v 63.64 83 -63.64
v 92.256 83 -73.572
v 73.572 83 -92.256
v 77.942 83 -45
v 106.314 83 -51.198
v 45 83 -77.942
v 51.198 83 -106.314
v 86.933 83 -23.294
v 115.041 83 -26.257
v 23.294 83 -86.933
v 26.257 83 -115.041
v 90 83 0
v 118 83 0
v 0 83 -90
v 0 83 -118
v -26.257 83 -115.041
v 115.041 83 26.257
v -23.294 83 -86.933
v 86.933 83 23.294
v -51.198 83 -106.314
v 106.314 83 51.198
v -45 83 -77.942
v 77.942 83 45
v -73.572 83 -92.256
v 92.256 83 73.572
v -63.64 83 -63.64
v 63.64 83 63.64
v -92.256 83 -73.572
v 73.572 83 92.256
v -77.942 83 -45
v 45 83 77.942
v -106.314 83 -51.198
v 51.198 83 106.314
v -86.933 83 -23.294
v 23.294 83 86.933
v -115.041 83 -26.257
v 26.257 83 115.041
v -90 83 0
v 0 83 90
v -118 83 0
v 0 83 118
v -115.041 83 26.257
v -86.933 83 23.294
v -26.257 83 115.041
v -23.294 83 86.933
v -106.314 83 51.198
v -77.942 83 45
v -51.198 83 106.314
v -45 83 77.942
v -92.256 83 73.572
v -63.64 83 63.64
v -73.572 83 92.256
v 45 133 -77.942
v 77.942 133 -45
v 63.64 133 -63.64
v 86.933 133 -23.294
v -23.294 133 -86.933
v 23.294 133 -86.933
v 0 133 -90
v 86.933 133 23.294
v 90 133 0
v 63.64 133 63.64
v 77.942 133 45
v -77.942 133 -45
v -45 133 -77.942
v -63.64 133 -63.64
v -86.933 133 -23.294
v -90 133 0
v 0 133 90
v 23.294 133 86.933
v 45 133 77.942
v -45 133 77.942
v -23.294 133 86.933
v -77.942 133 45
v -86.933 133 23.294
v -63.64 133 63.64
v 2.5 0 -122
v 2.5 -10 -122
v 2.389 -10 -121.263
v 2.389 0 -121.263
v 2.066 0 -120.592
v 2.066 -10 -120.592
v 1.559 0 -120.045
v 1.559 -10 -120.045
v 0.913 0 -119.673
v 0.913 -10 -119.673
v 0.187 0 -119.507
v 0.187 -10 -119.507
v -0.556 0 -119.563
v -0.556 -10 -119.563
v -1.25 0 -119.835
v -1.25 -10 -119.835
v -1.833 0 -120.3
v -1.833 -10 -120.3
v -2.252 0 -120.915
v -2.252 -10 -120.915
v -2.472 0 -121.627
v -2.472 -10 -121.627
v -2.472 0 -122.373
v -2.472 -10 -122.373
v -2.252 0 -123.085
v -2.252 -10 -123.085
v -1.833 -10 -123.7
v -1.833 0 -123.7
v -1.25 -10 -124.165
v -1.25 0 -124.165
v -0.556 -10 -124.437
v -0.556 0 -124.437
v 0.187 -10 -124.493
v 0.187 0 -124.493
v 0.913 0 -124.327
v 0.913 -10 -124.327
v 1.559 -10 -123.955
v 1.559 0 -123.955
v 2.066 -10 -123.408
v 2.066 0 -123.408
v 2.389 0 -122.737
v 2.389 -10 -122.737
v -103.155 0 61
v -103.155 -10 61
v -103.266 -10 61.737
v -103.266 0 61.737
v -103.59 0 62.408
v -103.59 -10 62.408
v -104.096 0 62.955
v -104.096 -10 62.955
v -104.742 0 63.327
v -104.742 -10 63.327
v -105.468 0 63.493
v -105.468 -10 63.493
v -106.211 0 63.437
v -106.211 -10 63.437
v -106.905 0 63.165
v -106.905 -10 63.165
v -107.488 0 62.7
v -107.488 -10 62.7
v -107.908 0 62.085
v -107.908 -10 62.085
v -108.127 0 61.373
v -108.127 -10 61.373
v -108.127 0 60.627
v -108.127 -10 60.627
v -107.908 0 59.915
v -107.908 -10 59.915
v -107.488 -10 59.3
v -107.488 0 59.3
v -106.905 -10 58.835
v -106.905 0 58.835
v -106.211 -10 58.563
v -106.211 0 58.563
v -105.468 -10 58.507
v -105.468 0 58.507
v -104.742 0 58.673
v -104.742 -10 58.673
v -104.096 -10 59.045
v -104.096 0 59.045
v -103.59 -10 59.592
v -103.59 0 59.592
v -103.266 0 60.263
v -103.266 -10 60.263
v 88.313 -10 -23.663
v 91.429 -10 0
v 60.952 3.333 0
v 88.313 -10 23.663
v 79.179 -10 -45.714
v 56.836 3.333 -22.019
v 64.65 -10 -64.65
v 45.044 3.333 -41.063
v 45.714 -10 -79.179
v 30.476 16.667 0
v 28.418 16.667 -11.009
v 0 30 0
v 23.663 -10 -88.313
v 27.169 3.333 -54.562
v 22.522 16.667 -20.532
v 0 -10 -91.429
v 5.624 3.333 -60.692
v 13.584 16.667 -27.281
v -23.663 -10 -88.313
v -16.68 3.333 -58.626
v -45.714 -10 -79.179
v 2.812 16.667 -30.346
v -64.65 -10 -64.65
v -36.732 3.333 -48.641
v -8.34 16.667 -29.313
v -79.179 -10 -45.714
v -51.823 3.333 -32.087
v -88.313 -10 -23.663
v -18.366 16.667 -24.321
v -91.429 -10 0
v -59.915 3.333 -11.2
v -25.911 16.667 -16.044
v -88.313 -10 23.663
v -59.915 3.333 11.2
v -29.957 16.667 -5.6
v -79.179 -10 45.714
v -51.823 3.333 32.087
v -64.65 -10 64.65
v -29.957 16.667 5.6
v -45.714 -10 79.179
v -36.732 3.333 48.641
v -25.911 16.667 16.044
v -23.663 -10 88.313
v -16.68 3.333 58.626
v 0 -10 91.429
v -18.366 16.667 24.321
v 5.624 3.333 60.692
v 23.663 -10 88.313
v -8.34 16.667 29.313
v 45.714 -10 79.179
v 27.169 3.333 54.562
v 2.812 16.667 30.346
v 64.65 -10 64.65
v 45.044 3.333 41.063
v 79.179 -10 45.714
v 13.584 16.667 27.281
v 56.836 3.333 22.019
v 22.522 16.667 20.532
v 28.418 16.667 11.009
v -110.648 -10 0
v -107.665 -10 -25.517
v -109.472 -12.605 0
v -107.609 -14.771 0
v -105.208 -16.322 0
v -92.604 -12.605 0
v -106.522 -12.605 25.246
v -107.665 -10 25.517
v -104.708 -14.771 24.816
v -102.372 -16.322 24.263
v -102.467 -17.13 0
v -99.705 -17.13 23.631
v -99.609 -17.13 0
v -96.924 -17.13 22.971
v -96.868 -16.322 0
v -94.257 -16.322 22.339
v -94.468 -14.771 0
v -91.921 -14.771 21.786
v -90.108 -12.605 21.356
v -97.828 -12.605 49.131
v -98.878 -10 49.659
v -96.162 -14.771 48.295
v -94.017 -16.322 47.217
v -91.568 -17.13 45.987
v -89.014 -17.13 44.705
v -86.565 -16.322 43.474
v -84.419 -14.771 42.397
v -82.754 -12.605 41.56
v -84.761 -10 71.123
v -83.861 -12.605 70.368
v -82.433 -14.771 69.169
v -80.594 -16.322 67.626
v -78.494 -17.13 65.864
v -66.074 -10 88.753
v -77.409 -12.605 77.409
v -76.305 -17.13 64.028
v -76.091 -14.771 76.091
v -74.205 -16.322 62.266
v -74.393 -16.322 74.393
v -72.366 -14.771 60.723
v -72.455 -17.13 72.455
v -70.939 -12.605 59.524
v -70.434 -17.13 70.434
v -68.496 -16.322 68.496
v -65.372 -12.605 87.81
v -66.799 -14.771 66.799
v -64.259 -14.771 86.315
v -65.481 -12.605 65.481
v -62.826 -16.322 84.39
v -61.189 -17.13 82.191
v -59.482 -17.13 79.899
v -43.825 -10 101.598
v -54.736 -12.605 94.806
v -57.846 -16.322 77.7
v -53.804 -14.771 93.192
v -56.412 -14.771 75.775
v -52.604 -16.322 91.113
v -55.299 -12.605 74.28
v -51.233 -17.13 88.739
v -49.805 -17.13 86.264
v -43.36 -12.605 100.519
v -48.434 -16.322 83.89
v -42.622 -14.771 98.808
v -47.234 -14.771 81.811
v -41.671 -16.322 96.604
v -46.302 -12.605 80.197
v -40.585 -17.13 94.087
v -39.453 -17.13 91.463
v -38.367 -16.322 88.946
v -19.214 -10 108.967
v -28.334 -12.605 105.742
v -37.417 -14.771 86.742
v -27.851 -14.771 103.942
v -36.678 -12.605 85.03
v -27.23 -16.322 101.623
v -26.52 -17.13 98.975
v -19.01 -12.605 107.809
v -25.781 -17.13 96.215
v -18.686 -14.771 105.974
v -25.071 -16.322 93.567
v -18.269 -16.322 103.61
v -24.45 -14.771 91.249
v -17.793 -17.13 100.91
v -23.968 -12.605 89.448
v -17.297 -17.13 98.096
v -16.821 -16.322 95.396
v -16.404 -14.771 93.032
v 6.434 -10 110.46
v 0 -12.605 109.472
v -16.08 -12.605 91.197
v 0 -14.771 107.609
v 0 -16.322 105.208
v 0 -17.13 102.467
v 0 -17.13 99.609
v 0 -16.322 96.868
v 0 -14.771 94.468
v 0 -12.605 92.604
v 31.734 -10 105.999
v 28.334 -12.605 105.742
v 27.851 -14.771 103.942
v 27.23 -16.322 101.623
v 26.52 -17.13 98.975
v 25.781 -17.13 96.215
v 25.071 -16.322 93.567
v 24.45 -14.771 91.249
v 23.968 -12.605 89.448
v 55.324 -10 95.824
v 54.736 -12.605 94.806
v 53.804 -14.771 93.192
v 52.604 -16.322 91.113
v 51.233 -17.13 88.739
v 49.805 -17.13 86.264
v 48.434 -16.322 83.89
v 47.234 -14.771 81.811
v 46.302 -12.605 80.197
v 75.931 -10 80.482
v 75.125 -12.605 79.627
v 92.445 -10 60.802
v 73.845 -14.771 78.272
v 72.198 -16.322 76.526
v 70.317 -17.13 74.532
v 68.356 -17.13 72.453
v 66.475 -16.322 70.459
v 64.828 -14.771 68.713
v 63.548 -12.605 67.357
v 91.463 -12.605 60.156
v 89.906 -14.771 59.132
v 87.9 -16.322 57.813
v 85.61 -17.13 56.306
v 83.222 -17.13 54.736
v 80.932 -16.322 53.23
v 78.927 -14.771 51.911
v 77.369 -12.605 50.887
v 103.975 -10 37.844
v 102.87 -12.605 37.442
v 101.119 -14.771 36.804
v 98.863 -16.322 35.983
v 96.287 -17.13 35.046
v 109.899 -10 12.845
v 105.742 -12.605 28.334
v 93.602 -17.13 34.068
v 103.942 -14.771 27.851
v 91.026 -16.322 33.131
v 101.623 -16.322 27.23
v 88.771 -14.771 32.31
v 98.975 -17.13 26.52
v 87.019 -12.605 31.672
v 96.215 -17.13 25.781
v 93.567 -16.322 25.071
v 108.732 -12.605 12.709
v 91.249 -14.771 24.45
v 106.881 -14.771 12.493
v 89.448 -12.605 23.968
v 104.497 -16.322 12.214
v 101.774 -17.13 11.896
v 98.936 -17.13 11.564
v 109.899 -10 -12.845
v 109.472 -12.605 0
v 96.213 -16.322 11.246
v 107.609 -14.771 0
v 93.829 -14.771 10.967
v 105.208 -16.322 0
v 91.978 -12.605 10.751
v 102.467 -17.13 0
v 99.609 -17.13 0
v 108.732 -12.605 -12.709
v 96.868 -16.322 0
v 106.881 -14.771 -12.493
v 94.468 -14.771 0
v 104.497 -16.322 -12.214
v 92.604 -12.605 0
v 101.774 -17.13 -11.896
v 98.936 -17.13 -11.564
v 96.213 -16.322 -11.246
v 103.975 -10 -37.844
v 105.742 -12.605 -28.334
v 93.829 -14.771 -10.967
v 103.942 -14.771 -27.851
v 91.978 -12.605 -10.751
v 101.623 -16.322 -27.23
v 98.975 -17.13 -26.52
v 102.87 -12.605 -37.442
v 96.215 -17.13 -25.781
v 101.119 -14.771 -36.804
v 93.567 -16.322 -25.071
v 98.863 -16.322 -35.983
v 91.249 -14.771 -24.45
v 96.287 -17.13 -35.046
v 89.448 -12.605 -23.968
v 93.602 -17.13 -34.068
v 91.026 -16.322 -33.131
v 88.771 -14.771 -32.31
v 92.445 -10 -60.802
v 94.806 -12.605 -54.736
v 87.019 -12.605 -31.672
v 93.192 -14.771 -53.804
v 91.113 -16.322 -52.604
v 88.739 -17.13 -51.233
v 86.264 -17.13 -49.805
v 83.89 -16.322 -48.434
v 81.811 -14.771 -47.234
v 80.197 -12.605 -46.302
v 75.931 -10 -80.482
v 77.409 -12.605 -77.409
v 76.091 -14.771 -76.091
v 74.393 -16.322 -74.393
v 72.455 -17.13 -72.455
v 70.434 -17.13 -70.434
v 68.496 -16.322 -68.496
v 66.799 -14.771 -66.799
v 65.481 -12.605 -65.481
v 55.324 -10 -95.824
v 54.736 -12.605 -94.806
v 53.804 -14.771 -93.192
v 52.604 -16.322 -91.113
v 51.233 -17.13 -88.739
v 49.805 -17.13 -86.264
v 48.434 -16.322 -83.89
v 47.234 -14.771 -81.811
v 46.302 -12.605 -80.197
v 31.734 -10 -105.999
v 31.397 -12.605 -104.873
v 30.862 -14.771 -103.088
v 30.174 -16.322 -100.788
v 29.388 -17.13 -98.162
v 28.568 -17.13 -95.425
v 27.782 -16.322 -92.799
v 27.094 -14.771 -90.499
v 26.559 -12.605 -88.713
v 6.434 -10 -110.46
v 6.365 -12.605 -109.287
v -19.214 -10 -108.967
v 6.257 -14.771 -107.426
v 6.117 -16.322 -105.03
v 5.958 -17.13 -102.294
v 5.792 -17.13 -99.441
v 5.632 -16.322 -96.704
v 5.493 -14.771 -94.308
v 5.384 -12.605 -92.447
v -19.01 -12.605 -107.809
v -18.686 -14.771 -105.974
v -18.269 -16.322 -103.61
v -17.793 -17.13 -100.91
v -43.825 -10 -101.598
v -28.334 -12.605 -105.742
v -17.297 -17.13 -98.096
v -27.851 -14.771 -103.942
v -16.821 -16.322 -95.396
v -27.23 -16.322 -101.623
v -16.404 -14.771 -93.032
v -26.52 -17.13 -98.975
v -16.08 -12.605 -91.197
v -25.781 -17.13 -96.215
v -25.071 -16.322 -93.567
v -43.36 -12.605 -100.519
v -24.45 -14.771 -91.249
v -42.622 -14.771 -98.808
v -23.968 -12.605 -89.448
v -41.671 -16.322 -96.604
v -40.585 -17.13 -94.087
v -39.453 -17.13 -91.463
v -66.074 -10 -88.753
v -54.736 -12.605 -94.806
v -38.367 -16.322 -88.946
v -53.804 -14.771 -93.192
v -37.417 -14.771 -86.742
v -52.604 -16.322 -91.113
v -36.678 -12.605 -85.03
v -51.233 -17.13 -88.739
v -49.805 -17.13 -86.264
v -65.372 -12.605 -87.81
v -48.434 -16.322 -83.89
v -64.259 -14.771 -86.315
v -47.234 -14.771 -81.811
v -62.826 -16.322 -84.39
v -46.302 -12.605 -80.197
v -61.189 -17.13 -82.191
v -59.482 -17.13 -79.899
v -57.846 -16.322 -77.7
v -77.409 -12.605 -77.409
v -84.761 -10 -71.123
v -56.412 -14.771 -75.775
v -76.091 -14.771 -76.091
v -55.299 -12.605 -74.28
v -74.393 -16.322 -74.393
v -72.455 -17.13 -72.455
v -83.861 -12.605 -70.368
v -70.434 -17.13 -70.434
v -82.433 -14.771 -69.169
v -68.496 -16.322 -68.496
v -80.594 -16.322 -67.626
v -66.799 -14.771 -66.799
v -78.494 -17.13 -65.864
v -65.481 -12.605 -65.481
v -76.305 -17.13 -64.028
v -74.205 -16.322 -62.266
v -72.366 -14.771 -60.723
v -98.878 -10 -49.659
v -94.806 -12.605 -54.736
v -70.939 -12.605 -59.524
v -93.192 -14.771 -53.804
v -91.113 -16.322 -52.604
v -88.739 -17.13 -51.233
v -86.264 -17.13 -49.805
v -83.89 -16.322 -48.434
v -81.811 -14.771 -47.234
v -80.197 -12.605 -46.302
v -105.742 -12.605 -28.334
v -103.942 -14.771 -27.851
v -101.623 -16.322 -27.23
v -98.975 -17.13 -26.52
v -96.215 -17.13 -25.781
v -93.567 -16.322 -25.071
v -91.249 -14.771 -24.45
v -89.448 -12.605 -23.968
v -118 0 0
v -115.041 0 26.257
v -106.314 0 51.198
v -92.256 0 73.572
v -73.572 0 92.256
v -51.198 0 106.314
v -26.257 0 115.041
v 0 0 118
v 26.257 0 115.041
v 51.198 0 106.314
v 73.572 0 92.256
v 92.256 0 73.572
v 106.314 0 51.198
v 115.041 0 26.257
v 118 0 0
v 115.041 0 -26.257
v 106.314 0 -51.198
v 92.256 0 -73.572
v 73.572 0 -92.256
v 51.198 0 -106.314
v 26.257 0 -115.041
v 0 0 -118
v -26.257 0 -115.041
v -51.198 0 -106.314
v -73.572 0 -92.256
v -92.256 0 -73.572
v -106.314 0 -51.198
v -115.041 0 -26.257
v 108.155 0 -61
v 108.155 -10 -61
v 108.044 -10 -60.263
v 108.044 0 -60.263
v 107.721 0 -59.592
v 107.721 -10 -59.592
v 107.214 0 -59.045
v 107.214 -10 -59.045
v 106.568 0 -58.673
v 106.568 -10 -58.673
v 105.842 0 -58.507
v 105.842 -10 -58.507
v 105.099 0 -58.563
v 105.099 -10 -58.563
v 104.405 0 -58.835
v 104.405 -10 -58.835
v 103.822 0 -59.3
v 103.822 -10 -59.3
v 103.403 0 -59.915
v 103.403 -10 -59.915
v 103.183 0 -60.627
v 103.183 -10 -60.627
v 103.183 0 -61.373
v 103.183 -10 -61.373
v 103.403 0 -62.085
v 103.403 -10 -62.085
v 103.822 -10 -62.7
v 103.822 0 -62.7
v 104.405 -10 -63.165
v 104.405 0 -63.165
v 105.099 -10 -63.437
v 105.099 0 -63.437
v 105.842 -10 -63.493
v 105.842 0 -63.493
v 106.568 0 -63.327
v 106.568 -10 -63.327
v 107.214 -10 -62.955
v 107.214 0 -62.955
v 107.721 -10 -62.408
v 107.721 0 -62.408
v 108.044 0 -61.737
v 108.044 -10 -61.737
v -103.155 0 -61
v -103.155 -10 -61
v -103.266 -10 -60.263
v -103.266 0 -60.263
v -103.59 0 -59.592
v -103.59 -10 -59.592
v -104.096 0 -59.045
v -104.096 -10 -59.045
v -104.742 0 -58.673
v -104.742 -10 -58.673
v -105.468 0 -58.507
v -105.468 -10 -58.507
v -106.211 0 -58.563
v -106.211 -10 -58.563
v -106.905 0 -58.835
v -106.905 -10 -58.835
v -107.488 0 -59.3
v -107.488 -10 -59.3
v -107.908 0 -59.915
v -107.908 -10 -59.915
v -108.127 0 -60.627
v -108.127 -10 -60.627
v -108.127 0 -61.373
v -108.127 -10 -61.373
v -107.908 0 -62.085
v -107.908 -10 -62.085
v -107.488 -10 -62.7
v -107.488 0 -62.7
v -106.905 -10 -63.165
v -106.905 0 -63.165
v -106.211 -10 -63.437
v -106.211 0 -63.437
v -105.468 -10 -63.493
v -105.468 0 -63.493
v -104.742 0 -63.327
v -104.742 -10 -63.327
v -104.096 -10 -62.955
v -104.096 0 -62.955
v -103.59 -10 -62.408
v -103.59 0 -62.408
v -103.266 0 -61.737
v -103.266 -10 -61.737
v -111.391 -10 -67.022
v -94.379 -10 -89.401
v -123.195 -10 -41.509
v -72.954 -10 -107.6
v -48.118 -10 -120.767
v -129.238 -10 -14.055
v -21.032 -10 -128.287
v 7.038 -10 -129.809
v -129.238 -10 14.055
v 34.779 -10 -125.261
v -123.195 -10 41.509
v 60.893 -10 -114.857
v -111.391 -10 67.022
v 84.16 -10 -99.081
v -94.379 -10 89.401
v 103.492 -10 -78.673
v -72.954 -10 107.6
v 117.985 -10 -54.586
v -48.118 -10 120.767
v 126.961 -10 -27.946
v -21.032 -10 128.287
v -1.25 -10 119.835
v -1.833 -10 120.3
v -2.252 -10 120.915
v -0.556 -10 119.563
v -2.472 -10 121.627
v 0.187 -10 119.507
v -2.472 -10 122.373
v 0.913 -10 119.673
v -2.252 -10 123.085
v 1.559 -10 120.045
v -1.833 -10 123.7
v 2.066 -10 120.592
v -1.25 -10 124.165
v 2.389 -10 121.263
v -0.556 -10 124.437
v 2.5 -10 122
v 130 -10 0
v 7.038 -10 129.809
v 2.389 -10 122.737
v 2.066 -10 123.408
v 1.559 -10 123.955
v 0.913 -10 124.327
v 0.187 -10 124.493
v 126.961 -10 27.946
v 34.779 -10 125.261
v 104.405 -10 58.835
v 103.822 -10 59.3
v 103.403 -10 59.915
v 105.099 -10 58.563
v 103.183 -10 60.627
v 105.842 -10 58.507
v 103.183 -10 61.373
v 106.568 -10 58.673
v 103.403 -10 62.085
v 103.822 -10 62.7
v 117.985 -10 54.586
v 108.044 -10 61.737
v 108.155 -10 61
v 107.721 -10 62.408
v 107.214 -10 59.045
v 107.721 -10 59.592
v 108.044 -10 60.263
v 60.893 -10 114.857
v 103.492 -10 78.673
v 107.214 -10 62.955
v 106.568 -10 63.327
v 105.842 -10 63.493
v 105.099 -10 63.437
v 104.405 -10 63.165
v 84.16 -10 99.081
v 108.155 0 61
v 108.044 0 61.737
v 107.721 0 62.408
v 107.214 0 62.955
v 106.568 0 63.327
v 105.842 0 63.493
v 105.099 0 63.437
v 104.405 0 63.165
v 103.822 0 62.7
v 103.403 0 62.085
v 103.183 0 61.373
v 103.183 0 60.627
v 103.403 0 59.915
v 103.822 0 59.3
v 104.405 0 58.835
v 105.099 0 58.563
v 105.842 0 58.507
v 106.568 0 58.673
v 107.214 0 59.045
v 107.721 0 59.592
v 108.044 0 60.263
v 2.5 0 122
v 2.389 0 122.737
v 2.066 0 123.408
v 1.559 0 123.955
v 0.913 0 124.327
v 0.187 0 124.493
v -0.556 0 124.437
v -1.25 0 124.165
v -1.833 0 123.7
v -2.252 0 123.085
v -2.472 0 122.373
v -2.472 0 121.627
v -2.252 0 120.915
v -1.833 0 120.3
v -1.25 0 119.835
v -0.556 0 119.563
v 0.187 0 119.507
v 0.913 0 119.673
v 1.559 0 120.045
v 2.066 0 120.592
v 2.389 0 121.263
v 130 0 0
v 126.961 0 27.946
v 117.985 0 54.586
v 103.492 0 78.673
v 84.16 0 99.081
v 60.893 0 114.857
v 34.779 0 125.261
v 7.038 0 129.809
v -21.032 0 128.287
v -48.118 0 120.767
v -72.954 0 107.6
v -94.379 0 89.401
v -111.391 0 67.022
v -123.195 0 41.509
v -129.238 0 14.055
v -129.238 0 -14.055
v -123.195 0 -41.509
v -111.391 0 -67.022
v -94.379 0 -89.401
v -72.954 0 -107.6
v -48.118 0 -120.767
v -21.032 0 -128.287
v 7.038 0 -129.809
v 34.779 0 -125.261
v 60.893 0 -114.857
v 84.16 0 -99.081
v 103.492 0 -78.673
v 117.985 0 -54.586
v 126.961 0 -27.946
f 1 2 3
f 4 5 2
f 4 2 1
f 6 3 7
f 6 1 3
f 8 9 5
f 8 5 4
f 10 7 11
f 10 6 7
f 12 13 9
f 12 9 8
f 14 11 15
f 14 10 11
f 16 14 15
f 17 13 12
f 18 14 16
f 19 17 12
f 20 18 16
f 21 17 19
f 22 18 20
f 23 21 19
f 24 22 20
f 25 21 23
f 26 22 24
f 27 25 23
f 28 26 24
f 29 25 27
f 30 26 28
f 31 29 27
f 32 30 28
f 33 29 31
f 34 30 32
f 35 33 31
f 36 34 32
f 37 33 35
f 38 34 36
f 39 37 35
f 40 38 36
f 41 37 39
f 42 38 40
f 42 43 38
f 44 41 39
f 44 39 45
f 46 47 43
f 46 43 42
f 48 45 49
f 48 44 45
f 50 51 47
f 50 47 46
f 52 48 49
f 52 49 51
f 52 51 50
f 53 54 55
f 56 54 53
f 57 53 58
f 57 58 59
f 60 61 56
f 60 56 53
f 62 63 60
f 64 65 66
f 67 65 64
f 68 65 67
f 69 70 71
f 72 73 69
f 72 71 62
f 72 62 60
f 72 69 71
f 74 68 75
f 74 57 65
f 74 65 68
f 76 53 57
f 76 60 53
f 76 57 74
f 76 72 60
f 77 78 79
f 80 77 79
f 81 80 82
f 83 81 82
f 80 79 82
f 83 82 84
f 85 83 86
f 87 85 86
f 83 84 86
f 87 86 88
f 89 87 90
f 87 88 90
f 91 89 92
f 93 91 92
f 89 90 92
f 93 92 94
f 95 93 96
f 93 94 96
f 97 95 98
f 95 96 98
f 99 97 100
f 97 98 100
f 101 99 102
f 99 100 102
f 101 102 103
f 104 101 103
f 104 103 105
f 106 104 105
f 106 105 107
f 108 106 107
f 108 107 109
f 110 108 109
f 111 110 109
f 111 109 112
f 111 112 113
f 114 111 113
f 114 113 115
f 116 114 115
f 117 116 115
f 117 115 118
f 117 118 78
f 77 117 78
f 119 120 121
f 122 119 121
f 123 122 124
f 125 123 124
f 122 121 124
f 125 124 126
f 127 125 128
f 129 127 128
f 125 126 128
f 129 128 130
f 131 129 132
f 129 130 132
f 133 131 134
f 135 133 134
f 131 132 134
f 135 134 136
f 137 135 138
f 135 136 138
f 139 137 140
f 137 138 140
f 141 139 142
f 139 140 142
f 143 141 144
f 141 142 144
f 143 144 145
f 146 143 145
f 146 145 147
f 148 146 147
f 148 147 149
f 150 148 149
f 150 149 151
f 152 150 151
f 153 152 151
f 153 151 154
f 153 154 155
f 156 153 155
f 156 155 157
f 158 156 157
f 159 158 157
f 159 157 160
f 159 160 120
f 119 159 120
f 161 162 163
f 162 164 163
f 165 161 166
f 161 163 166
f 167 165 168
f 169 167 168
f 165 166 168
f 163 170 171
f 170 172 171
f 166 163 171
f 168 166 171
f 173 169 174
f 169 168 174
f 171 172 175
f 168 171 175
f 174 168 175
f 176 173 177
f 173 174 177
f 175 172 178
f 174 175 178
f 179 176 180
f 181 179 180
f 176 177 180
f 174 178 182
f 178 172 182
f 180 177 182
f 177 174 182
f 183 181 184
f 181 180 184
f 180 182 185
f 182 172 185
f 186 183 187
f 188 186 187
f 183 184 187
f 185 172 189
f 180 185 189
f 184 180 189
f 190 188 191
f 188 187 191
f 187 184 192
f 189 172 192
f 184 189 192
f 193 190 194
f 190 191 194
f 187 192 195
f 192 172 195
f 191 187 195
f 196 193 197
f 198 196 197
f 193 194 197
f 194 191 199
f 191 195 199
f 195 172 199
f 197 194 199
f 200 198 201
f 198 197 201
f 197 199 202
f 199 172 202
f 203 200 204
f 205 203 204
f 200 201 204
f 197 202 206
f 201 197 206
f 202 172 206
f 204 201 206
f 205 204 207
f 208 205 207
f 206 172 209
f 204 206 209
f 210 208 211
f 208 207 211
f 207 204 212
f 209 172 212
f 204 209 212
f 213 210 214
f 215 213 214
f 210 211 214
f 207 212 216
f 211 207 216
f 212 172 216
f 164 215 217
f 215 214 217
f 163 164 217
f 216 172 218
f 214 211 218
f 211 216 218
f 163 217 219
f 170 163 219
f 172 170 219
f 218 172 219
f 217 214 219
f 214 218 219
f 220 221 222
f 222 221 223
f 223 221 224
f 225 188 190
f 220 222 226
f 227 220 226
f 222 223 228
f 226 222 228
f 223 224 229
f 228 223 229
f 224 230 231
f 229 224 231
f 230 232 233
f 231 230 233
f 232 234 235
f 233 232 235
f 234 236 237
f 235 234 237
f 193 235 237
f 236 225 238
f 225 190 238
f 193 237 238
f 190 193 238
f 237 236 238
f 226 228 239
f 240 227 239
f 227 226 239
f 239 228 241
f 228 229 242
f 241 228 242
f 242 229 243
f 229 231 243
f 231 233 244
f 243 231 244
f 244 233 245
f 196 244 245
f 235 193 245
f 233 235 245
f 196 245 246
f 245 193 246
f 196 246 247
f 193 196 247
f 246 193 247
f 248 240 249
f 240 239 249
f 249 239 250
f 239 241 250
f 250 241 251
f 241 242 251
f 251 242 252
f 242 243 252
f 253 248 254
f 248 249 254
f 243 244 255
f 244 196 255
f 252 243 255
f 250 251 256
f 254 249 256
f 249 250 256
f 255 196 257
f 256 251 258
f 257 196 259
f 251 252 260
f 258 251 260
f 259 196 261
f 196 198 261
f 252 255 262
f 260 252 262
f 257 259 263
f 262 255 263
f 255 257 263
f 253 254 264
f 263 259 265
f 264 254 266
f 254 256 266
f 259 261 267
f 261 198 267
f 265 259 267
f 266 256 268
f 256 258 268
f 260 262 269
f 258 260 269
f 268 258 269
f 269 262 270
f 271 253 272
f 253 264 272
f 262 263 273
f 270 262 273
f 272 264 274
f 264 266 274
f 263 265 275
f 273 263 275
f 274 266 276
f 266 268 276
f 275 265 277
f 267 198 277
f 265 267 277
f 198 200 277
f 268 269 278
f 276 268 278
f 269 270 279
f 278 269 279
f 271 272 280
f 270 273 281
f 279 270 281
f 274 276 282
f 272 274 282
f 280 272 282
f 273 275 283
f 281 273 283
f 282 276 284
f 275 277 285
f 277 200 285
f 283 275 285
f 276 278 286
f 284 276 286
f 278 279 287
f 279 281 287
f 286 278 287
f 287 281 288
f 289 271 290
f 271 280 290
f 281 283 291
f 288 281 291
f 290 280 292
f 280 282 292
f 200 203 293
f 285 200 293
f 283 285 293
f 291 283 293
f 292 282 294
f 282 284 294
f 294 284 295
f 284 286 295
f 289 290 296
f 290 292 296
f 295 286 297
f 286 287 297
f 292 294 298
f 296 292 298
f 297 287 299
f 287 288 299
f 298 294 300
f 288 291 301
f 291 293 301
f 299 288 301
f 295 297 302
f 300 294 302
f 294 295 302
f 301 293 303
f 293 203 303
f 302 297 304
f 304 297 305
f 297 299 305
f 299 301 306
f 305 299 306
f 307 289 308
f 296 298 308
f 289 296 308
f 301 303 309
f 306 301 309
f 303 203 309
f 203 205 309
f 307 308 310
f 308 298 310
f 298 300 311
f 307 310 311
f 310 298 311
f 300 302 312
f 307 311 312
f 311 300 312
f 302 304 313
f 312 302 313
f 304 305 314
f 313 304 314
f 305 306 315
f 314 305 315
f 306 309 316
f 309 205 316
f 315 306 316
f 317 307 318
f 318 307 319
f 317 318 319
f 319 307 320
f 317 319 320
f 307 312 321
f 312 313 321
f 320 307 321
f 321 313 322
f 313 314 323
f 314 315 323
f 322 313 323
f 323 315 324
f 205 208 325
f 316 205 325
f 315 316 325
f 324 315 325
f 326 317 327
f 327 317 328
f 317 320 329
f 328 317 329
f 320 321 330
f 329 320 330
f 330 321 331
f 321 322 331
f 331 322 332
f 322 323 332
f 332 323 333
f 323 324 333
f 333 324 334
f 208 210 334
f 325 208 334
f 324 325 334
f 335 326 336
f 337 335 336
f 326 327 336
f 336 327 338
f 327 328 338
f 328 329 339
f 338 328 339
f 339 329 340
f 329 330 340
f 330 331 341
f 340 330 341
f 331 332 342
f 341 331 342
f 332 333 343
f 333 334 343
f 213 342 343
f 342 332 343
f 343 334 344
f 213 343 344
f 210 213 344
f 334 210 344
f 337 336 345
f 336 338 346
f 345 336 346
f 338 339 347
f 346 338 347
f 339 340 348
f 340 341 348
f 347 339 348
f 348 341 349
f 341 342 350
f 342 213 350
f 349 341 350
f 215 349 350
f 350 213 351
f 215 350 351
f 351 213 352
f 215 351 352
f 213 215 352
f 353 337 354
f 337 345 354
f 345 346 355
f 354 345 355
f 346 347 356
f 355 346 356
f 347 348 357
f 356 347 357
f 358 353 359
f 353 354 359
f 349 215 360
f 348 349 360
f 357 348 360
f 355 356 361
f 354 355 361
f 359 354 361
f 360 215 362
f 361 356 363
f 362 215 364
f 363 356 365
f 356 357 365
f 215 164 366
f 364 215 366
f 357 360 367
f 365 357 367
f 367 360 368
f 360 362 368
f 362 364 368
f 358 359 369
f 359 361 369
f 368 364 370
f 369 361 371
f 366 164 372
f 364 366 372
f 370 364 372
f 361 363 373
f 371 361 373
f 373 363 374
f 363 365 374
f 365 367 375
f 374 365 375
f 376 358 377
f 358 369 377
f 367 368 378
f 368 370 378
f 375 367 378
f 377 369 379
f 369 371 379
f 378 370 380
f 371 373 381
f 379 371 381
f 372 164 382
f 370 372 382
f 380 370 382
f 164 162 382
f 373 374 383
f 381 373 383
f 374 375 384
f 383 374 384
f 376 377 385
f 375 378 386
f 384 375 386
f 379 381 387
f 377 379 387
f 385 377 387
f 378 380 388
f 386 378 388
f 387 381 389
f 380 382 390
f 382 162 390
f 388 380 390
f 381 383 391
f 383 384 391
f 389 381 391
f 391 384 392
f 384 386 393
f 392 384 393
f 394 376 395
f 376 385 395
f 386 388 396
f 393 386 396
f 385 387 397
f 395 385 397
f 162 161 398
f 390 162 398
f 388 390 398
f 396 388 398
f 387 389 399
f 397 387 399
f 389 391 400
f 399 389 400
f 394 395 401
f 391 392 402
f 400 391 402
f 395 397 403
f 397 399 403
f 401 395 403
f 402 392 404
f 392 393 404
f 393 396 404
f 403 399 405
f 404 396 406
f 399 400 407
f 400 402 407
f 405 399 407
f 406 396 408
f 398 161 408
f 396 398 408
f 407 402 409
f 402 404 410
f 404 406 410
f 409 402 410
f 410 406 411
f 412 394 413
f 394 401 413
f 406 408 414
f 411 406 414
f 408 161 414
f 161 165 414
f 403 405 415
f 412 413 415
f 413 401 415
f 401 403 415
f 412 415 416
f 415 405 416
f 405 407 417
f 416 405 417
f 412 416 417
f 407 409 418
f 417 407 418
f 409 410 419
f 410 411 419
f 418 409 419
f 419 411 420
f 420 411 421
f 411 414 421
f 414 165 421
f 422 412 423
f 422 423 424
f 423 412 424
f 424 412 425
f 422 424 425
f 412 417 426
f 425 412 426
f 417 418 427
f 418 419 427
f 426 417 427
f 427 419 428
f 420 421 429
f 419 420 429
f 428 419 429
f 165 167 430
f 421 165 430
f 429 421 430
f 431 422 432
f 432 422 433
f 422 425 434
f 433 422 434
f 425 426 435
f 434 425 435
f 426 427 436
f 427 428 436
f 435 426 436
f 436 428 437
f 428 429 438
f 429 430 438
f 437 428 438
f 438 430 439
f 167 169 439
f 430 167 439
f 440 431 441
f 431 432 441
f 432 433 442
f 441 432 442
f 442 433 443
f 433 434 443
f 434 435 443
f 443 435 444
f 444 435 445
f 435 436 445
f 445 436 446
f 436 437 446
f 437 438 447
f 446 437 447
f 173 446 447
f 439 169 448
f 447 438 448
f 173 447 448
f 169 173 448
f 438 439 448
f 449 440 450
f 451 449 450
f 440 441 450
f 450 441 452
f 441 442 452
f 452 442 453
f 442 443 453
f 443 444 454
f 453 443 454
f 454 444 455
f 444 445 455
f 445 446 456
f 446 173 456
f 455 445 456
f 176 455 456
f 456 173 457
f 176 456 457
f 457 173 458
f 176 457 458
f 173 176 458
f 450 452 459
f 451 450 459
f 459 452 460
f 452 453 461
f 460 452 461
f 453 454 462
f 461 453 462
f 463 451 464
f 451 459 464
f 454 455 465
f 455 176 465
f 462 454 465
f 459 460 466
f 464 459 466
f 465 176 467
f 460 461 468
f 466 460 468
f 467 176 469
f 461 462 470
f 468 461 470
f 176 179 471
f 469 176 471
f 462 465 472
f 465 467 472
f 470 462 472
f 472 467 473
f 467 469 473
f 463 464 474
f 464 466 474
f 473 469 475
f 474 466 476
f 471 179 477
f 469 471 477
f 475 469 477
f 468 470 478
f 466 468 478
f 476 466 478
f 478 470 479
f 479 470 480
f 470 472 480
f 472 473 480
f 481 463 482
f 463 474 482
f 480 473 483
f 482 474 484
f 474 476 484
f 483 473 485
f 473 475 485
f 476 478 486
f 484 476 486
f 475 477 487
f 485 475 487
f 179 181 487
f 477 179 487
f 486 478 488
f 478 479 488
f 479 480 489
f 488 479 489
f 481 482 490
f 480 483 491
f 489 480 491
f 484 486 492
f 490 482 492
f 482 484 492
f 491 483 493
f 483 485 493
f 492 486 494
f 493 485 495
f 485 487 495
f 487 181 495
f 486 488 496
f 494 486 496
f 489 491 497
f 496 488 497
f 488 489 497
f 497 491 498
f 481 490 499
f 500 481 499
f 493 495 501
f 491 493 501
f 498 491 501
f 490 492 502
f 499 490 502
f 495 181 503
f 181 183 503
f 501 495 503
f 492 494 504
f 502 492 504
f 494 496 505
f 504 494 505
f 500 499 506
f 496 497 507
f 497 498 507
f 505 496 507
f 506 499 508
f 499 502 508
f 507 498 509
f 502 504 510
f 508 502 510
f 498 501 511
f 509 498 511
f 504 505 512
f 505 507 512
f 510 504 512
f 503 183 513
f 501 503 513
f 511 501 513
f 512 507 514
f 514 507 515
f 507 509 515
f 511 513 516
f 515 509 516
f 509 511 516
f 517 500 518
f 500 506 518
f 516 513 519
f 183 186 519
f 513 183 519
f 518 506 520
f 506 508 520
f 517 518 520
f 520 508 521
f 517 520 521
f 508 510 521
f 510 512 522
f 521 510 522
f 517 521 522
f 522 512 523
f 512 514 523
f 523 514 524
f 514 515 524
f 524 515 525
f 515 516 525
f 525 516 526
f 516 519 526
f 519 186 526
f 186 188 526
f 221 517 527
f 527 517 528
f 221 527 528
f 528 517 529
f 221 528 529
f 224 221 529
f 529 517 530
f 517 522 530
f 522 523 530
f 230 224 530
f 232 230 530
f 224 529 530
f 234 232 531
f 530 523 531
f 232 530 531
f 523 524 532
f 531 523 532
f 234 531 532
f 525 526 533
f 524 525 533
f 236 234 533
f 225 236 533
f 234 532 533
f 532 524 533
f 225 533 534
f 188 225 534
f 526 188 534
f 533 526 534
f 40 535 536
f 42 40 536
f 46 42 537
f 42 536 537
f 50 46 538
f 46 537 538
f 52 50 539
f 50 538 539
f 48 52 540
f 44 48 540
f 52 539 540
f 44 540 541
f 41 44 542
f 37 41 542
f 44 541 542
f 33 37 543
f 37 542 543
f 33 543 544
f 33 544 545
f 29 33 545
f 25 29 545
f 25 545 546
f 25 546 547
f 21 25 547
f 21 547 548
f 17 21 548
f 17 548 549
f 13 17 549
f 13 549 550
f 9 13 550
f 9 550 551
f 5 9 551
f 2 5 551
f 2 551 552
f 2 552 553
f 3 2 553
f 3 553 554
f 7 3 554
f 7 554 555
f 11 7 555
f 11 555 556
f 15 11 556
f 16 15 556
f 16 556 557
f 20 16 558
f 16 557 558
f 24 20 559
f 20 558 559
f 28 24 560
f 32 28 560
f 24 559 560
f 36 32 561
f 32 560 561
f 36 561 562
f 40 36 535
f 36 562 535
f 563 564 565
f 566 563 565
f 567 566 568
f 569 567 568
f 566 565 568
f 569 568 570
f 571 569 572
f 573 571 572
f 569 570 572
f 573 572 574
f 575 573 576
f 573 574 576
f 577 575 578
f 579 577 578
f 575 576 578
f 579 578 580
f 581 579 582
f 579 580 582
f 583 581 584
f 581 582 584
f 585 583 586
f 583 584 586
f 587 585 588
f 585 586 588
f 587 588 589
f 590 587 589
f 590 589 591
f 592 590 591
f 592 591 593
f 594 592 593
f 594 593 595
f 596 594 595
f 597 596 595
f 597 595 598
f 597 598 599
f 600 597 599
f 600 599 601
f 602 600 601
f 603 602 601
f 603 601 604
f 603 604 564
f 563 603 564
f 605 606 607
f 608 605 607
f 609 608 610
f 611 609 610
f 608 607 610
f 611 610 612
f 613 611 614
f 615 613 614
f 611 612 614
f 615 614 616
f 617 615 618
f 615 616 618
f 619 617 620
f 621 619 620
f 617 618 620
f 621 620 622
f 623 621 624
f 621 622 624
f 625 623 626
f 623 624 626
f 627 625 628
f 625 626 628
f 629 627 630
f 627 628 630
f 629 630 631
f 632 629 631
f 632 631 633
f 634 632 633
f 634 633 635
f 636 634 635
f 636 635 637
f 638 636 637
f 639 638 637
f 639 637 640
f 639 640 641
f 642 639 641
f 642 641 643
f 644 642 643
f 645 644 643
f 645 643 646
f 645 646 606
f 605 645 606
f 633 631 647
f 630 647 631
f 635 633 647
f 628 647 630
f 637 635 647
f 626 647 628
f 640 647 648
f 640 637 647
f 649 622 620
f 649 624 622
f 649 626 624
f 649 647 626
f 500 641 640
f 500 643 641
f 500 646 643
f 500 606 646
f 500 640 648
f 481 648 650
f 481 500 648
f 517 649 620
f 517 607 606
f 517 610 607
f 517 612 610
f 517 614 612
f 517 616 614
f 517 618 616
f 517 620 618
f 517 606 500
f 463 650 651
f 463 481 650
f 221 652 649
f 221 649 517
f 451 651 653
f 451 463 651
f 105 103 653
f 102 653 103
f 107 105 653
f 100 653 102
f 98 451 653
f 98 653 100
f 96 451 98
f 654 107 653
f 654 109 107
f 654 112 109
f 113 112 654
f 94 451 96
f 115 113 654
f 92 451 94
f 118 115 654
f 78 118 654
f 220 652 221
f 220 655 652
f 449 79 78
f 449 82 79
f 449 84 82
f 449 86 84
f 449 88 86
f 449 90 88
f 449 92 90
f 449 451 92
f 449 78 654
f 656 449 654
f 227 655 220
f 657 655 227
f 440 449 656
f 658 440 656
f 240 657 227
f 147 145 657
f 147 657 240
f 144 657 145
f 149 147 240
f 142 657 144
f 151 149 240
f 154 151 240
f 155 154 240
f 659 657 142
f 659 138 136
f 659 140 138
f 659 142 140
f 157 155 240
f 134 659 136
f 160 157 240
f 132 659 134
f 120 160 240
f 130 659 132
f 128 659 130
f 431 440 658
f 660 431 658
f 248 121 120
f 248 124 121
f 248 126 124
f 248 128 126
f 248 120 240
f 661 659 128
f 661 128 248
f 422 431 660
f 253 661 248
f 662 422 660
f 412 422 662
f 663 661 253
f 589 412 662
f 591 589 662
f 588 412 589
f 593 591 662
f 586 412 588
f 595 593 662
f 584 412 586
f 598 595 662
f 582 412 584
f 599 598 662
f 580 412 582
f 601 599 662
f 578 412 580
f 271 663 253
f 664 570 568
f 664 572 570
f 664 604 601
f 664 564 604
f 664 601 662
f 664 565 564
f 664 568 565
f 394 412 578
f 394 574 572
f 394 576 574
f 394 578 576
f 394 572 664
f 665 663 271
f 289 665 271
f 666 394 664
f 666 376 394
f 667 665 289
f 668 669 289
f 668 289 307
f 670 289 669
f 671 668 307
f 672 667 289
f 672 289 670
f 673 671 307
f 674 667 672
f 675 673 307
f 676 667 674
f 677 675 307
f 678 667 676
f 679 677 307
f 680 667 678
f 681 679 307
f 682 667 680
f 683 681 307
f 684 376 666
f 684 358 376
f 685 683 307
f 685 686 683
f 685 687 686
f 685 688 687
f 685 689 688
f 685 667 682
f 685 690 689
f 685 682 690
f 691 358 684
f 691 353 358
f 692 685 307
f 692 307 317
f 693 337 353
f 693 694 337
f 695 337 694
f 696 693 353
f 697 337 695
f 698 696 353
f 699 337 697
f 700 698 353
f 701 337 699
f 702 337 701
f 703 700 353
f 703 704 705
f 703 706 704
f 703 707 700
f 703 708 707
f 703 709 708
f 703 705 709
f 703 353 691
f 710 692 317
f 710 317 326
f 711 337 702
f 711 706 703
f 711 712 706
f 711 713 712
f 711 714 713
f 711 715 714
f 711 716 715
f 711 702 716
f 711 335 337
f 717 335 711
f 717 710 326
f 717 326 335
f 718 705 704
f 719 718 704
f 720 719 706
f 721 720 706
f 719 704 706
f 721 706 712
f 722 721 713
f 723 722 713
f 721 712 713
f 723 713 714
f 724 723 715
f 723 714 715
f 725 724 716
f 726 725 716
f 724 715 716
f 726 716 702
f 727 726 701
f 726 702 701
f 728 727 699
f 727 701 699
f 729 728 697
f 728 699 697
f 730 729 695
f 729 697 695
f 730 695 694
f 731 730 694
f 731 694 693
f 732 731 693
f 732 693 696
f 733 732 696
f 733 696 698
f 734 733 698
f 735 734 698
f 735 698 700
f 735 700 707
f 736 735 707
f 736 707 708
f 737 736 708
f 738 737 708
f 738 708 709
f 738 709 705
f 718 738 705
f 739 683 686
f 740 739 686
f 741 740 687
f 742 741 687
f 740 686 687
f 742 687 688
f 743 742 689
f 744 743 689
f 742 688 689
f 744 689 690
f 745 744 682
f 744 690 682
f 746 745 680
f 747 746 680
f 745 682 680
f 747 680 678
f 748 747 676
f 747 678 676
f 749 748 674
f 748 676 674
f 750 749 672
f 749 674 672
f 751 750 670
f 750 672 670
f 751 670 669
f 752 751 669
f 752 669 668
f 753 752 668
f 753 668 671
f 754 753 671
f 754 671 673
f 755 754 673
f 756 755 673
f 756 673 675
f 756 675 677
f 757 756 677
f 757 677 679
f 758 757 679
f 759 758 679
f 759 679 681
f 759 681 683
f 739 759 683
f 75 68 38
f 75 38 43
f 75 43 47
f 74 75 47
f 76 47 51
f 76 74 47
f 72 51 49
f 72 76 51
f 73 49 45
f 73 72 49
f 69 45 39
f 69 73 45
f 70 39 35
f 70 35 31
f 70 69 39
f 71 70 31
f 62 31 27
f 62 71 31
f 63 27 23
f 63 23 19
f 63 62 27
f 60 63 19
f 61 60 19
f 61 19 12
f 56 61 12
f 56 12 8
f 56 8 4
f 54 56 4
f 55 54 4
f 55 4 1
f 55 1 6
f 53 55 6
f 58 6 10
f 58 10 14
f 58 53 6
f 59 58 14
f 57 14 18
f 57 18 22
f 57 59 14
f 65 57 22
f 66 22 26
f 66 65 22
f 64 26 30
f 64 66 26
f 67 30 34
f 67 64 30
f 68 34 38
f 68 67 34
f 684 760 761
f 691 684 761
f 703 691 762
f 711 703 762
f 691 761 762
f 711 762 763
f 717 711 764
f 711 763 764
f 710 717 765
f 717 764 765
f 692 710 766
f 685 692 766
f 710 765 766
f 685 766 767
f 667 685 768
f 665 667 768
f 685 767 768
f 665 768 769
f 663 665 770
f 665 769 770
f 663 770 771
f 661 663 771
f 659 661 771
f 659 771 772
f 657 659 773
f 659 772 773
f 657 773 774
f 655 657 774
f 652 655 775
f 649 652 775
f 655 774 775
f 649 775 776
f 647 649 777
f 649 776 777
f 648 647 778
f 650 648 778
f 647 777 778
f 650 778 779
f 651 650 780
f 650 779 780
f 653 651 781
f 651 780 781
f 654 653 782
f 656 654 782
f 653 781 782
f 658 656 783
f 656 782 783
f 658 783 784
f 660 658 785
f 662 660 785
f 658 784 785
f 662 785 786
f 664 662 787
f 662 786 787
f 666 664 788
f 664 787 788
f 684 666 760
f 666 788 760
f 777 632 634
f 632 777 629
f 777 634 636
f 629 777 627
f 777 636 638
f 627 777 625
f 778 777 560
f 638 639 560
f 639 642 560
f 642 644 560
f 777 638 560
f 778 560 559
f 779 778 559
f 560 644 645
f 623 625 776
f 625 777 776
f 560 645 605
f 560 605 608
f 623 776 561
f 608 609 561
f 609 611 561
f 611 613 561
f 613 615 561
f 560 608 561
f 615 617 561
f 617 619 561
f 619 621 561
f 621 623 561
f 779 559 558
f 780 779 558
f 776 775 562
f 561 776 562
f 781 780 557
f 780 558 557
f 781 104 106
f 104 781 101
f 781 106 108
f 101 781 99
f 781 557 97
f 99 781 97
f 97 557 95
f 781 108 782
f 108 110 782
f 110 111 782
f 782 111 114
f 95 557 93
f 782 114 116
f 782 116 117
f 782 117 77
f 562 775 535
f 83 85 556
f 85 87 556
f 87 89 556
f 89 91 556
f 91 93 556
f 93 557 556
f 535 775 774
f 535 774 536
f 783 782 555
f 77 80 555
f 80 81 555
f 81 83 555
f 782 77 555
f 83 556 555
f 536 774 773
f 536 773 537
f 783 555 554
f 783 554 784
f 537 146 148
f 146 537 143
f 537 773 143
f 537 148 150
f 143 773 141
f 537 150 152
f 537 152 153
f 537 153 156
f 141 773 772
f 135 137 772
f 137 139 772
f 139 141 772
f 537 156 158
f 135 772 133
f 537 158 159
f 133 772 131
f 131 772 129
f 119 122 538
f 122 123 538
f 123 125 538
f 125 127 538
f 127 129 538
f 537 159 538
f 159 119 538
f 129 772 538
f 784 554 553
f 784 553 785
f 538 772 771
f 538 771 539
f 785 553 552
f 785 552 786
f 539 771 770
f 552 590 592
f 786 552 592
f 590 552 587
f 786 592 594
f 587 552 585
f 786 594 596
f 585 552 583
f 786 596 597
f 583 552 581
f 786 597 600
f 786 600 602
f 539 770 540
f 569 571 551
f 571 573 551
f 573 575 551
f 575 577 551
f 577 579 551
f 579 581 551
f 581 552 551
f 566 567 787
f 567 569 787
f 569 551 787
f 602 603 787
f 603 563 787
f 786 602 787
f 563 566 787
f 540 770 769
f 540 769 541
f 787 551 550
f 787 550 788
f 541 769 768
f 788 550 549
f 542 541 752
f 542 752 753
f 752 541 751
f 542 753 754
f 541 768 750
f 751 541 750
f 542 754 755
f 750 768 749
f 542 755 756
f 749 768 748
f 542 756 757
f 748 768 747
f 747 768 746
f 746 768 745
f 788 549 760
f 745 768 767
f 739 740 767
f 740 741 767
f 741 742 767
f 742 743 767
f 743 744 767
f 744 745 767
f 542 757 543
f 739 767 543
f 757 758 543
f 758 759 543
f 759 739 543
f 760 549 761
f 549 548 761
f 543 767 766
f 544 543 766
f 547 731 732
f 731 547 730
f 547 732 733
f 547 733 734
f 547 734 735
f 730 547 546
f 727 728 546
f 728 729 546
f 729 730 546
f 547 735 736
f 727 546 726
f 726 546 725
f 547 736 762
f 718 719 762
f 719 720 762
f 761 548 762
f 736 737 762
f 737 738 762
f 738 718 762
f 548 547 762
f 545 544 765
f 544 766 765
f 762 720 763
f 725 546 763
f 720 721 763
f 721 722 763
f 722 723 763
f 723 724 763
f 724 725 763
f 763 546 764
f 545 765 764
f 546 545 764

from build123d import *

# Parameters (mm, degrees)
F0_R      = 130
F1_DEPTH  = 10
F2_R      = 118
F3_DEPTH  = 133
F9_D      = 5
F10_R     = 118
F10_R_2   = 90
F11_DEPTH = 50


with BuildPart() as f1:
    # F0 (on Front) → F1 (new body)
    with BuildSketch(Plane.XZ):
        Circle(F0_R)
    extrude(amount=F1_DEPTH)

    # F2 (on face) → F3 (join)
    with BuildSketch(Plane(origin=(0, 0, 0), x_dir=(-1, 0, 0), z_dir=(0, 1, 0))):
        Circle(F2_R)
    extrude(amount=F3_DEPTH)

    # F4 (on Top) → F5 (revolve, cut)
    with BuildSketch(Plane.XY):
        Polygon((0, 0), (0, -40), (160, -40), (0, 30), align=None)
    revolve(axis=Axis((0, -20, 0), (0, 1, 0)), mode=Mode.SUBTRACT)

    # F6 (on Top) → F7 (revolve)
    with BuildSketch(Plane.XY):
        with BuildLine():
            Line((-91.428571, -10), (-110.647532, -10))
            ThreePointArc((-110.647532, -10), (-101.038052, -17.23271), (-91.428571, -10))
        make_face()
    revolve(axis=Axis((0, -10, 0), (0, 1, 0)))

    # F9 (through all)
    with Locations(Plane(origin=(0, 0, 0), x_dir=(-1, 0, 0), z_dir=(0, 1, 0))):
        with Locations((105.655099, 61), (105.655099, -61), (0, -122), (0, 122), (-105.655099, 61), (-105.655099, -61)):
            Hole(F9_D / 2)

    # F10 (on face) → F11 (cut)
    with BuildSketch(Plane(origin=(0, 133, 0), x_dir=(-1, 0, 0), z_dir=(0, 1, 0))):
        Circle(F10_R)
        Circle(F10_R_2, mode=Mode.SUBTRACT)
    extrude(amount=-F11_DEPTH, mode=Mode.SUBTRACT)


solid = f1.part
